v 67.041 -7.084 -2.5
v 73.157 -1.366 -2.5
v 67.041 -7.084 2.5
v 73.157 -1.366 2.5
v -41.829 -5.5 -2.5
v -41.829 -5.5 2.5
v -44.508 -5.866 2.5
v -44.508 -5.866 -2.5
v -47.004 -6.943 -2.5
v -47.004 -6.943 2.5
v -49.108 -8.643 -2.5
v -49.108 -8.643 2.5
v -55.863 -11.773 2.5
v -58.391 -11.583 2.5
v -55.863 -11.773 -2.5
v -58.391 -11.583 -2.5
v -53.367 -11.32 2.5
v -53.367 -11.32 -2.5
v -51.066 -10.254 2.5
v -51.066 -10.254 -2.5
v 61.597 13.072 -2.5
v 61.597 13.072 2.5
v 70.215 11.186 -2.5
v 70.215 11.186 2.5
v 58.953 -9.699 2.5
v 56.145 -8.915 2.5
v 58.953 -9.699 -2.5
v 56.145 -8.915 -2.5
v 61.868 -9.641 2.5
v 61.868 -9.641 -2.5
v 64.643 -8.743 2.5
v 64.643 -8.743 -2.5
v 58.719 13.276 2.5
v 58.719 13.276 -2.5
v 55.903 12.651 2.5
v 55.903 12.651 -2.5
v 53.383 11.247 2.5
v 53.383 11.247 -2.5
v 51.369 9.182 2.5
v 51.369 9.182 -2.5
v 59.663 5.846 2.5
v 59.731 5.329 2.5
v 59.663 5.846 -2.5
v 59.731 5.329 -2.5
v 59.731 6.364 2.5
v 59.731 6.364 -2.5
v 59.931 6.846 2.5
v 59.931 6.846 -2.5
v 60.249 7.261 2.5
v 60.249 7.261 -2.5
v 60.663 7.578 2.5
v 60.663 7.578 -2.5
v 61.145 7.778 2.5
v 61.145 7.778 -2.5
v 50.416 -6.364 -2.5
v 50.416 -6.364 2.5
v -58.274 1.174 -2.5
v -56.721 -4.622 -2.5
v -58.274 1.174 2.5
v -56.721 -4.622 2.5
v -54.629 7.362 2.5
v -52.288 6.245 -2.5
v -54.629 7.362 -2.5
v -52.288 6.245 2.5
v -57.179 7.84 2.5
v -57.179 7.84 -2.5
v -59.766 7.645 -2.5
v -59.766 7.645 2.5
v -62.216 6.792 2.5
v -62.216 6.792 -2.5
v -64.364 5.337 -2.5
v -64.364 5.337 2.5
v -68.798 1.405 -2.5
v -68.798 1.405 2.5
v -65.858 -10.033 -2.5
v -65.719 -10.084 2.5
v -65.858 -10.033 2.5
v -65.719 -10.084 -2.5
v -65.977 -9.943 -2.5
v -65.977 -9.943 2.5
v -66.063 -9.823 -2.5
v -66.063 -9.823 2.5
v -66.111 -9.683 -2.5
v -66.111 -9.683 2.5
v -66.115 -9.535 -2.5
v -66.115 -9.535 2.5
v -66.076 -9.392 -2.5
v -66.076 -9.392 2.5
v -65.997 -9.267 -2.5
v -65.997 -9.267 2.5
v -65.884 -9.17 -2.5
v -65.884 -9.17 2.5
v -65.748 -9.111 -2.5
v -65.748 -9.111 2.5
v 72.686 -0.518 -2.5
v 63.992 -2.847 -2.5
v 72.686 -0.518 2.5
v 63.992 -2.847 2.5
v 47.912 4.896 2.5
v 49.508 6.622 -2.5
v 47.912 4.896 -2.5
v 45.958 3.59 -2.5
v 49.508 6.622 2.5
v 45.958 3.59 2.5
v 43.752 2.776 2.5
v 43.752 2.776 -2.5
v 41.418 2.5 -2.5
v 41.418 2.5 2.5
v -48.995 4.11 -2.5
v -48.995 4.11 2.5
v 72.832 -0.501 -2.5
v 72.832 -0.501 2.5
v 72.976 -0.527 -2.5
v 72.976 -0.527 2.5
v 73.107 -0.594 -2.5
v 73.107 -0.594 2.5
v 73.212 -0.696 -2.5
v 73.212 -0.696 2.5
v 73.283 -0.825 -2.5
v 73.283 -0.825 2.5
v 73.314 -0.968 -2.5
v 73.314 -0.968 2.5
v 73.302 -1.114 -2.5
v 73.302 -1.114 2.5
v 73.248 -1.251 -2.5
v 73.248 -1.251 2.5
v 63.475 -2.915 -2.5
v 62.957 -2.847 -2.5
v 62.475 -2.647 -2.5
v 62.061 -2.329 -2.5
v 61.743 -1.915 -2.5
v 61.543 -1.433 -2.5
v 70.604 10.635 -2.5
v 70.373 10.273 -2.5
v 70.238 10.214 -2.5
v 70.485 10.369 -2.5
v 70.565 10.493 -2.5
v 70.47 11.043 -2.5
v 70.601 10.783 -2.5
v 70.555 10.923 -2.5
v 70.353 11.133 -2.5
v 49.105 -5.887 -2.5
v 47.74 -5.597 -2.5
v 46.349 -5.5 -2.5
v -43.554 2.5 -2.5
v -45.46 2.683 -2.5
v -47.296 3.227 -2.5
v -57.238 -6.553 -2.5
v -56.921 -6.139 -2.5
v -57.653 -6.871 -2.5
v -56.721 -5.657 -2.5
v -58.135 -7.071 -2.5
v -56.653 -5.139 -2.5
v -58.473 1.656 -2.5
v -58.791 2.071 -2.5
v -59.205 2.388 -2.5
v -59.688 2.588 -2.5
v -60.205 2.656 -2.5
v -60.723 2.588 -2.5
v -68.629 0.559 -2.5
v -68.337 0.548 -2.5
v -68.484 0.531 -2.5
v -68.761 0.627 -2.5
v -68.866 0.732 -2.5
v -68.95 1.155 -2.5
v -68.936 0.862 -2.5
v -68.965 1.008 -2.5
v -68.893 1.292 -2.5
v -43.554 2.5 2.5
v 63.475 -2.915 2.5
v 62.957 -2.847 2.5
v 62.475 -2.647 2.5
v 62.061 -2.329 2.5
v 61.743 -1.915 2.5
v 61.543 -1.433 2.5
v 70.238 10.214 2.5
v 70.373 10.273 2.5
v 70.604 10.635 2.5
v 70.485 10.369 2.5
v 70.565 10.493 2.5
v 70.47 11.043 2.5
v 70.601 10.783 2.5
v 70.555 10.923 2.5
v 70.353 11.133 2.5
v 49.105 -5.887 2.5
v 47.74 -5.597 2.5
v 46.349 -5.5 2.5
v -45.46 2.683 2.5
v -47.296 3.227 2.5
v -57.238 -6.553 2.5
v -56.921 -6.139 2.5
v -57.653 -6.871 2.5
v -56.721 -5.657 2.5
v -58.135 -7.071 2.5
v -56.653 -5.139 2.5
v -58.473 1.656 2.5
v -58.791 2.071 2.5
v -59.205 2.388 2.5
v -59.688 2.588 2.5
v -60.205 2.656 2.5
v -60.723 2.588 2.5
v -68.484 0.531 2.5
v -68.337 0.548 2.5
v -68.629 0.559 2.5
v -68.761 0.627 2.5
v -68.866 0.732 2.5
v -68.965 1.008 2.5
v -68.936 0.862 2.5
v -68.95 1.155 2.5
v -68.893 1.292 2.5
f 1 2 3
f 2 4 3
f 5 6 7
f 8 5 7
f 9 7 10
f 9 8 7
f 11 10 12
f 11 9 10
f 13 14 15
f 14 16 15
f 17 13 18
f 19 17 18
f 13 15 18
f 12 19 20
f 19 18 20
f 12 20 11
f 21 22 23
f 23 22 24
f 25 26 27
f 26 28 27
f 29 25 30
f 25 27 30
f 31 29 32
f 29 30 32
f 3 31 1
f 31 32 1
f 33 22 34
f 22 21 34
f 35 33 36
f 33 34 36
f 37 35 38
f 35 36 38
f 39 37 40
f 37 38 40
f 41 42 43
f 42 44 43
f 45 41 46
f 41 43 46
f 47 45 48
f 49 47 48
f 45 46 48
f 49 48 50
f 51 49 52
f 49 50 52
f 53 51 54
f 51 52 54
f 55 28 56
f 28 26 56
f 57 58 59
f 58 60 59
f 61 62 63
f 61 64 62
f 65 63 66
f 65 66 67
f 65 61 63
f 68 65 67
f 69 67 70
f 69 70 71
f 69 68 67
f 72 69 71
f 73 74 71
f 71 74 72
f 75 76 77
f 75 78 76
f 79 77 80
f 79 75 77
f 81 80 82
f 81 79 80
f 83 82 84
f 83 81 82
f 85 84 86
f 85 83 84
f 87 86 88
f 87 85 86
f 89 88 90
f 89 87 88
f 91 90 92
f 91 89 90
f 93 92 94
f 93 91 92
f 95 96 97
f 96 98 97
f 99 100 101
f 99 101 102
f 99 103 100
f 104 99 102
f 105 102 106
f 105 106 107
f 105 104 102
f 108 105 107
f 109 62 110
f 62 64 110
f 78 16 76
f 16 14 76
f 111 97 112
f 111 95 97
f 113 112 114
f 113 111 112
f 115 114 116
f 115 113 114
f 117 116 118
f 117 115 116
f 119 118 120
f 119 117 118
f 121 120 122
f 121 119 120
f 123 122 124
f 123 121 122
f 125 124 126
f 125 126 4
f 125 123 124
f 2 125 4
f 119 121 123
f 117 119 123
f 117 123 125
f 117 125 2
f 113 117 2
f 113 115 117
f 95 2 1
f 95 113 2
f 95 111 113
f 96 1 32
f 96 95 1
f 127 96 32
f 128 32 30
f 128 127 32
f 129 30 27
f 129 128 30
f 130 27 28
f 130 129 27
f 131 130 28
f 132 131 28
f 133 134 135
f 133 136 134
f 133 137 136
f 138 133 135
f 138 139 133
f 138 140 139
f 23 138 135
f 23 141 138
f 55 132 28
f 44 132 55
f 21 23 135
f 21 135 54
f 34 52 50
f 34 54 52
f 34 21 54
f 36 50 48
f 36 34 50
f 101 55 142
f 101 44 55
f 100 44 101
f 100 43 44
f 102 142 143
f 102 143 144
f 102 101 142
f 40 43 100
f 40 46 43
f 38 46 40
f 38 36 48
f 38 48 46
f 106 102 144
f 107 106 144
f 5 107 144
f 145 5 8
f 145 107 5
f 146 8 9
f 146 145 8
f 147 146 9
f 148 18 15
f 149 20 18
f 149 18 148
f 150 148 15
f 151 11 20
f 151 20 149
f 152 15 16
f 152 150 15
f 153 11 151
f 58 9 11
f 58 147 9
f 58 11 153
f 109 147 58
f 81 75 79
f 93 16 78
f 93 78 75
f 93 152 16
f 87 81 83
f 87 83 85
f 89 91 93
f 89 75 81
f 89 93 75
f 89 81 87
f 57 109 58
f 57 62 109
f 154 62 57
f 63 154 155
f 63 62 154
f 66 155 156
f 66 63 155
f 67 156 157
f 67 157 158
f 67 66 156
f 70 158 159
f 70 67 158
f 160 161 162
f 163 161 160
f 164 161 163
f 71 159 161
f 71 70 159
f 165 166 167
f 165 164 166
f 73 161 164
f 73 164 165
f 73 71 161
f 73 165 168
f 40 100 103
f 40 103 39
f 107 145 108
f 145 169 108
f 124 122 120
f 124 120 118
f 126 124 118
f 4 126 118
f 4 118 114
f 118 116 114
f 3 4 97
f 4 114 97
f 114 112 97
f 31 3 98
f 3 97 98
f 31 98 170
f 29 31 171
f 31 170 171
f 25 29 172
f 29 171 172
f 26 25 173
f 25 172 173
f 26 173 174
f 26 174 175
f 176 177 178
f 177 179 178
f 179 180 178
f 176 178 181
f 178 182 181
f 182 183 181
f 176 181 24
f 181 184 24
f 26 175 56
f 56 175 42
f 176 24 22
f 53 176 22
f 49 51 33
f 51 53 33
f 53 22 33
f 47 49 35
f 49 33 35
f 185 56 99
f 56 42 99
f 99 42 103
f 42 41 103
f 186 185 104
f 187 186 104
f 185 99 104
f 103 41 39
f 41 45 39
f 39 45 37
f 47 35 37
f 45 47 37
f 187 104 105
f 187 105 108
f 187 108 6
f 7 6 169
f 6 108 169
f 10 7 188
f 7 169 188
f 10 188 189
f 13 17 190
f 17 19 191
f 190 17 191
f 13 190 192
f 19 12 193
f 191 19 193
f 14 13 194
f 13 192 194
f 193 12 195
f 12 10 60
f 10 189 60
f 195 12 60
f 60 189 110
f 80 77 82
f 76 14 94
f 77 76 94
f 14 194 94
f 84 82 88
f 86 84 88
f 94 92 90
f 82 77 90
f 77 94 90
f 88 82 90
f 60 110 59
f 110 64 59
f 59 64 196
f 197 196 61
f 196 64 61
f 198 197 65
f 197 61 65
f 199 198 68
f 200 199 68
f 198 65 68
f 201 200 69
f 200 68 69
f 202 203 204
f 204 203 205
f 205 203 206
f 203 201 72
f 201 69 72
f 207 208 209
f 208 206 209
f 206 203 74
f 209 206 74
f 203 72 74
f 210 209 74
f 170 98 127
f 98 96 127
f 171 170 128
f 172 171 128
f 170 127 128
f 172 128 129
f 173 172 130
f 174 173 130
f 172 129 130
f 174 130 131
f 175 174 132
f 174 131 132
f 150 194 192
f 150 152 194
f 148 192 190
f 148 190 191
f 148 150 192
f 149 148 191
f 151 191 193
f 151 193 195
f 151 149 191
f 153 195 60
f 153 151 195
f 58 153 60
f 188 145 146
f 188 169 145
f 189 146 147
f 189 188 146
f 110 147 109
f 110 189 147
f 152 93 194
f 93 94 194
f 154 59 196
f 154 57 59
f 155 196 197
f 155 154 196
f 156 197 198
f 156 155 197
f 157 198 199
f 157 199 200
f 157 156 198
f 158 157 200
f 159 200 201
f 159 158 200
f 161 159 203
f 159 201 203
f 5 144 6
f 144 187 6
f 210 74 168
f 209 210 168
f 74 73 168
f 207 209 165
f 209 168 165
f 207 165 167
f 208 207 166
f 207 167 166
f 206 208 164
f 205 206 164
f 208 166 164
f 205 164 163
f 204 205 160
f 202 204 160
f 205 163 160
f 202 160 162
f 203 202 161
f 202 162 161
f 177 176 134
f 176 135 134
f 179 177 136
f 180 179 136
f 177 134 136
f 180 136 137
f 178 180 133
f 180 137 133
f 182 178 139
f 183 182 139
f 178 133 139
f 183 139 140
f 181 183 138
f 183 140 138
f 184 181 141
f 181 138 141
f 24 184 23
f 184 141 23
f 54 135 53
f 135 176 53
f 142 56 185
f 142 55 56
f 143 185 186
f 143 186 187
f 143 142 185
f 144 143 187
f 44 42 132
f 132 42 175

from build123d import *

# Parameters (mm, degrees)
AUFSATZ_LINEAR_AUSTRAGEN1_DEPTH = 2.5
VERRUNDUNG1_R                   = 10
VERRUNDUNG2_R                   = 10
VERRUNDUNG3_R                   = 2
VERRUNDUNG4_R                   = 0.5
VERRUNDUNG5_R                   = 10


with BuildPart() as part:
    # Skizze1 → Aufsatz-Linear austragen1 (new, symmetric)
    with BuildSketch(Plane.XY):
        Polygon((46.512935857, 2.5), (55.211178367, 14.470305023), (72.222811922, 10.746349053), (59.213582381, 7.260536503), (62.060591877, -3.364647586), (74.617627619, 0), (62.199292585, -11.609692287), (48.474059835, -5.5), (-46.512935857, -5.5), (-52.459487047, -12.797272415), (-67.79418193, -9.659258263), (-56.203072015, -6.553429722), (-58.791262466, 3.105828541), (-70.382372381, 0), (-58.671144129, 10.384947415), (-46.512935857, 2.5), align=None)
    extrude(amount=AUFSATZ_LINEAR_AUSTRAGEN1_DEPTH, both=True)

    # Verrundung1
    verrundung1_edges = [part.edges().sort_by_distance(p)[0] for p in [
        (-52.459487047, -12.797272415, 0),
        (-58.671144129, 10.384947415, 0),
    ]]
    fillet(verrundung1_edges, radius=VERRUNDUNG1_R)

    # Verrundung2
    verrundung2_edges = [part.edges().sort_by_distance(p)[0] for p in [
        (62.199292585, -11.609692287, 0),
        (55.211178367, 14.470305023, 0),
    ]]
    fillet(verrundung2_edges, radius=VERRUNDUNG2_R)

    # Verrundung3
    verrundung3_edges = [part.edges().sort_by_distance(p)[0] for p in [
        (59.213582381, 7.260536503, 0),
        (62.060591877, -3.364647586, 0),
        (-56.203072015, -6.553429722, 0),
        (-58.791262466, 3.105828541, 0),
    ]]
    fillet(verrundung3_edges, radius=VERRUNDUNG3_R)

    # Verrundung4
    verrundung4_edges = [part.edges().sort_by_distance(p)[0] for p in [
        (72.222811922, 10.746349053, 0),
        (74.617627619, 0, 0),
        (-67.79418193, -9.659258263, 0),
        (-70.382372381, 0, 0),
    ]]
    fillet(verrundung4_edges, radius=VERRUNDUNG4_R)

    # Verrundung5
    verrundung5_edges = [part.edges().sort_by_distance(p)[0] for p in [
        (46.512935857, 2.5, 0),
        (48.474059835, -5.5, 0),
        (-46.512935857, -5.5, 0),
        (-46.512935857, 2.5, 0),
    ]]
    fillet(verrundung5_edges, radius=VERRUNDUNG5_R)


solid = part.part
